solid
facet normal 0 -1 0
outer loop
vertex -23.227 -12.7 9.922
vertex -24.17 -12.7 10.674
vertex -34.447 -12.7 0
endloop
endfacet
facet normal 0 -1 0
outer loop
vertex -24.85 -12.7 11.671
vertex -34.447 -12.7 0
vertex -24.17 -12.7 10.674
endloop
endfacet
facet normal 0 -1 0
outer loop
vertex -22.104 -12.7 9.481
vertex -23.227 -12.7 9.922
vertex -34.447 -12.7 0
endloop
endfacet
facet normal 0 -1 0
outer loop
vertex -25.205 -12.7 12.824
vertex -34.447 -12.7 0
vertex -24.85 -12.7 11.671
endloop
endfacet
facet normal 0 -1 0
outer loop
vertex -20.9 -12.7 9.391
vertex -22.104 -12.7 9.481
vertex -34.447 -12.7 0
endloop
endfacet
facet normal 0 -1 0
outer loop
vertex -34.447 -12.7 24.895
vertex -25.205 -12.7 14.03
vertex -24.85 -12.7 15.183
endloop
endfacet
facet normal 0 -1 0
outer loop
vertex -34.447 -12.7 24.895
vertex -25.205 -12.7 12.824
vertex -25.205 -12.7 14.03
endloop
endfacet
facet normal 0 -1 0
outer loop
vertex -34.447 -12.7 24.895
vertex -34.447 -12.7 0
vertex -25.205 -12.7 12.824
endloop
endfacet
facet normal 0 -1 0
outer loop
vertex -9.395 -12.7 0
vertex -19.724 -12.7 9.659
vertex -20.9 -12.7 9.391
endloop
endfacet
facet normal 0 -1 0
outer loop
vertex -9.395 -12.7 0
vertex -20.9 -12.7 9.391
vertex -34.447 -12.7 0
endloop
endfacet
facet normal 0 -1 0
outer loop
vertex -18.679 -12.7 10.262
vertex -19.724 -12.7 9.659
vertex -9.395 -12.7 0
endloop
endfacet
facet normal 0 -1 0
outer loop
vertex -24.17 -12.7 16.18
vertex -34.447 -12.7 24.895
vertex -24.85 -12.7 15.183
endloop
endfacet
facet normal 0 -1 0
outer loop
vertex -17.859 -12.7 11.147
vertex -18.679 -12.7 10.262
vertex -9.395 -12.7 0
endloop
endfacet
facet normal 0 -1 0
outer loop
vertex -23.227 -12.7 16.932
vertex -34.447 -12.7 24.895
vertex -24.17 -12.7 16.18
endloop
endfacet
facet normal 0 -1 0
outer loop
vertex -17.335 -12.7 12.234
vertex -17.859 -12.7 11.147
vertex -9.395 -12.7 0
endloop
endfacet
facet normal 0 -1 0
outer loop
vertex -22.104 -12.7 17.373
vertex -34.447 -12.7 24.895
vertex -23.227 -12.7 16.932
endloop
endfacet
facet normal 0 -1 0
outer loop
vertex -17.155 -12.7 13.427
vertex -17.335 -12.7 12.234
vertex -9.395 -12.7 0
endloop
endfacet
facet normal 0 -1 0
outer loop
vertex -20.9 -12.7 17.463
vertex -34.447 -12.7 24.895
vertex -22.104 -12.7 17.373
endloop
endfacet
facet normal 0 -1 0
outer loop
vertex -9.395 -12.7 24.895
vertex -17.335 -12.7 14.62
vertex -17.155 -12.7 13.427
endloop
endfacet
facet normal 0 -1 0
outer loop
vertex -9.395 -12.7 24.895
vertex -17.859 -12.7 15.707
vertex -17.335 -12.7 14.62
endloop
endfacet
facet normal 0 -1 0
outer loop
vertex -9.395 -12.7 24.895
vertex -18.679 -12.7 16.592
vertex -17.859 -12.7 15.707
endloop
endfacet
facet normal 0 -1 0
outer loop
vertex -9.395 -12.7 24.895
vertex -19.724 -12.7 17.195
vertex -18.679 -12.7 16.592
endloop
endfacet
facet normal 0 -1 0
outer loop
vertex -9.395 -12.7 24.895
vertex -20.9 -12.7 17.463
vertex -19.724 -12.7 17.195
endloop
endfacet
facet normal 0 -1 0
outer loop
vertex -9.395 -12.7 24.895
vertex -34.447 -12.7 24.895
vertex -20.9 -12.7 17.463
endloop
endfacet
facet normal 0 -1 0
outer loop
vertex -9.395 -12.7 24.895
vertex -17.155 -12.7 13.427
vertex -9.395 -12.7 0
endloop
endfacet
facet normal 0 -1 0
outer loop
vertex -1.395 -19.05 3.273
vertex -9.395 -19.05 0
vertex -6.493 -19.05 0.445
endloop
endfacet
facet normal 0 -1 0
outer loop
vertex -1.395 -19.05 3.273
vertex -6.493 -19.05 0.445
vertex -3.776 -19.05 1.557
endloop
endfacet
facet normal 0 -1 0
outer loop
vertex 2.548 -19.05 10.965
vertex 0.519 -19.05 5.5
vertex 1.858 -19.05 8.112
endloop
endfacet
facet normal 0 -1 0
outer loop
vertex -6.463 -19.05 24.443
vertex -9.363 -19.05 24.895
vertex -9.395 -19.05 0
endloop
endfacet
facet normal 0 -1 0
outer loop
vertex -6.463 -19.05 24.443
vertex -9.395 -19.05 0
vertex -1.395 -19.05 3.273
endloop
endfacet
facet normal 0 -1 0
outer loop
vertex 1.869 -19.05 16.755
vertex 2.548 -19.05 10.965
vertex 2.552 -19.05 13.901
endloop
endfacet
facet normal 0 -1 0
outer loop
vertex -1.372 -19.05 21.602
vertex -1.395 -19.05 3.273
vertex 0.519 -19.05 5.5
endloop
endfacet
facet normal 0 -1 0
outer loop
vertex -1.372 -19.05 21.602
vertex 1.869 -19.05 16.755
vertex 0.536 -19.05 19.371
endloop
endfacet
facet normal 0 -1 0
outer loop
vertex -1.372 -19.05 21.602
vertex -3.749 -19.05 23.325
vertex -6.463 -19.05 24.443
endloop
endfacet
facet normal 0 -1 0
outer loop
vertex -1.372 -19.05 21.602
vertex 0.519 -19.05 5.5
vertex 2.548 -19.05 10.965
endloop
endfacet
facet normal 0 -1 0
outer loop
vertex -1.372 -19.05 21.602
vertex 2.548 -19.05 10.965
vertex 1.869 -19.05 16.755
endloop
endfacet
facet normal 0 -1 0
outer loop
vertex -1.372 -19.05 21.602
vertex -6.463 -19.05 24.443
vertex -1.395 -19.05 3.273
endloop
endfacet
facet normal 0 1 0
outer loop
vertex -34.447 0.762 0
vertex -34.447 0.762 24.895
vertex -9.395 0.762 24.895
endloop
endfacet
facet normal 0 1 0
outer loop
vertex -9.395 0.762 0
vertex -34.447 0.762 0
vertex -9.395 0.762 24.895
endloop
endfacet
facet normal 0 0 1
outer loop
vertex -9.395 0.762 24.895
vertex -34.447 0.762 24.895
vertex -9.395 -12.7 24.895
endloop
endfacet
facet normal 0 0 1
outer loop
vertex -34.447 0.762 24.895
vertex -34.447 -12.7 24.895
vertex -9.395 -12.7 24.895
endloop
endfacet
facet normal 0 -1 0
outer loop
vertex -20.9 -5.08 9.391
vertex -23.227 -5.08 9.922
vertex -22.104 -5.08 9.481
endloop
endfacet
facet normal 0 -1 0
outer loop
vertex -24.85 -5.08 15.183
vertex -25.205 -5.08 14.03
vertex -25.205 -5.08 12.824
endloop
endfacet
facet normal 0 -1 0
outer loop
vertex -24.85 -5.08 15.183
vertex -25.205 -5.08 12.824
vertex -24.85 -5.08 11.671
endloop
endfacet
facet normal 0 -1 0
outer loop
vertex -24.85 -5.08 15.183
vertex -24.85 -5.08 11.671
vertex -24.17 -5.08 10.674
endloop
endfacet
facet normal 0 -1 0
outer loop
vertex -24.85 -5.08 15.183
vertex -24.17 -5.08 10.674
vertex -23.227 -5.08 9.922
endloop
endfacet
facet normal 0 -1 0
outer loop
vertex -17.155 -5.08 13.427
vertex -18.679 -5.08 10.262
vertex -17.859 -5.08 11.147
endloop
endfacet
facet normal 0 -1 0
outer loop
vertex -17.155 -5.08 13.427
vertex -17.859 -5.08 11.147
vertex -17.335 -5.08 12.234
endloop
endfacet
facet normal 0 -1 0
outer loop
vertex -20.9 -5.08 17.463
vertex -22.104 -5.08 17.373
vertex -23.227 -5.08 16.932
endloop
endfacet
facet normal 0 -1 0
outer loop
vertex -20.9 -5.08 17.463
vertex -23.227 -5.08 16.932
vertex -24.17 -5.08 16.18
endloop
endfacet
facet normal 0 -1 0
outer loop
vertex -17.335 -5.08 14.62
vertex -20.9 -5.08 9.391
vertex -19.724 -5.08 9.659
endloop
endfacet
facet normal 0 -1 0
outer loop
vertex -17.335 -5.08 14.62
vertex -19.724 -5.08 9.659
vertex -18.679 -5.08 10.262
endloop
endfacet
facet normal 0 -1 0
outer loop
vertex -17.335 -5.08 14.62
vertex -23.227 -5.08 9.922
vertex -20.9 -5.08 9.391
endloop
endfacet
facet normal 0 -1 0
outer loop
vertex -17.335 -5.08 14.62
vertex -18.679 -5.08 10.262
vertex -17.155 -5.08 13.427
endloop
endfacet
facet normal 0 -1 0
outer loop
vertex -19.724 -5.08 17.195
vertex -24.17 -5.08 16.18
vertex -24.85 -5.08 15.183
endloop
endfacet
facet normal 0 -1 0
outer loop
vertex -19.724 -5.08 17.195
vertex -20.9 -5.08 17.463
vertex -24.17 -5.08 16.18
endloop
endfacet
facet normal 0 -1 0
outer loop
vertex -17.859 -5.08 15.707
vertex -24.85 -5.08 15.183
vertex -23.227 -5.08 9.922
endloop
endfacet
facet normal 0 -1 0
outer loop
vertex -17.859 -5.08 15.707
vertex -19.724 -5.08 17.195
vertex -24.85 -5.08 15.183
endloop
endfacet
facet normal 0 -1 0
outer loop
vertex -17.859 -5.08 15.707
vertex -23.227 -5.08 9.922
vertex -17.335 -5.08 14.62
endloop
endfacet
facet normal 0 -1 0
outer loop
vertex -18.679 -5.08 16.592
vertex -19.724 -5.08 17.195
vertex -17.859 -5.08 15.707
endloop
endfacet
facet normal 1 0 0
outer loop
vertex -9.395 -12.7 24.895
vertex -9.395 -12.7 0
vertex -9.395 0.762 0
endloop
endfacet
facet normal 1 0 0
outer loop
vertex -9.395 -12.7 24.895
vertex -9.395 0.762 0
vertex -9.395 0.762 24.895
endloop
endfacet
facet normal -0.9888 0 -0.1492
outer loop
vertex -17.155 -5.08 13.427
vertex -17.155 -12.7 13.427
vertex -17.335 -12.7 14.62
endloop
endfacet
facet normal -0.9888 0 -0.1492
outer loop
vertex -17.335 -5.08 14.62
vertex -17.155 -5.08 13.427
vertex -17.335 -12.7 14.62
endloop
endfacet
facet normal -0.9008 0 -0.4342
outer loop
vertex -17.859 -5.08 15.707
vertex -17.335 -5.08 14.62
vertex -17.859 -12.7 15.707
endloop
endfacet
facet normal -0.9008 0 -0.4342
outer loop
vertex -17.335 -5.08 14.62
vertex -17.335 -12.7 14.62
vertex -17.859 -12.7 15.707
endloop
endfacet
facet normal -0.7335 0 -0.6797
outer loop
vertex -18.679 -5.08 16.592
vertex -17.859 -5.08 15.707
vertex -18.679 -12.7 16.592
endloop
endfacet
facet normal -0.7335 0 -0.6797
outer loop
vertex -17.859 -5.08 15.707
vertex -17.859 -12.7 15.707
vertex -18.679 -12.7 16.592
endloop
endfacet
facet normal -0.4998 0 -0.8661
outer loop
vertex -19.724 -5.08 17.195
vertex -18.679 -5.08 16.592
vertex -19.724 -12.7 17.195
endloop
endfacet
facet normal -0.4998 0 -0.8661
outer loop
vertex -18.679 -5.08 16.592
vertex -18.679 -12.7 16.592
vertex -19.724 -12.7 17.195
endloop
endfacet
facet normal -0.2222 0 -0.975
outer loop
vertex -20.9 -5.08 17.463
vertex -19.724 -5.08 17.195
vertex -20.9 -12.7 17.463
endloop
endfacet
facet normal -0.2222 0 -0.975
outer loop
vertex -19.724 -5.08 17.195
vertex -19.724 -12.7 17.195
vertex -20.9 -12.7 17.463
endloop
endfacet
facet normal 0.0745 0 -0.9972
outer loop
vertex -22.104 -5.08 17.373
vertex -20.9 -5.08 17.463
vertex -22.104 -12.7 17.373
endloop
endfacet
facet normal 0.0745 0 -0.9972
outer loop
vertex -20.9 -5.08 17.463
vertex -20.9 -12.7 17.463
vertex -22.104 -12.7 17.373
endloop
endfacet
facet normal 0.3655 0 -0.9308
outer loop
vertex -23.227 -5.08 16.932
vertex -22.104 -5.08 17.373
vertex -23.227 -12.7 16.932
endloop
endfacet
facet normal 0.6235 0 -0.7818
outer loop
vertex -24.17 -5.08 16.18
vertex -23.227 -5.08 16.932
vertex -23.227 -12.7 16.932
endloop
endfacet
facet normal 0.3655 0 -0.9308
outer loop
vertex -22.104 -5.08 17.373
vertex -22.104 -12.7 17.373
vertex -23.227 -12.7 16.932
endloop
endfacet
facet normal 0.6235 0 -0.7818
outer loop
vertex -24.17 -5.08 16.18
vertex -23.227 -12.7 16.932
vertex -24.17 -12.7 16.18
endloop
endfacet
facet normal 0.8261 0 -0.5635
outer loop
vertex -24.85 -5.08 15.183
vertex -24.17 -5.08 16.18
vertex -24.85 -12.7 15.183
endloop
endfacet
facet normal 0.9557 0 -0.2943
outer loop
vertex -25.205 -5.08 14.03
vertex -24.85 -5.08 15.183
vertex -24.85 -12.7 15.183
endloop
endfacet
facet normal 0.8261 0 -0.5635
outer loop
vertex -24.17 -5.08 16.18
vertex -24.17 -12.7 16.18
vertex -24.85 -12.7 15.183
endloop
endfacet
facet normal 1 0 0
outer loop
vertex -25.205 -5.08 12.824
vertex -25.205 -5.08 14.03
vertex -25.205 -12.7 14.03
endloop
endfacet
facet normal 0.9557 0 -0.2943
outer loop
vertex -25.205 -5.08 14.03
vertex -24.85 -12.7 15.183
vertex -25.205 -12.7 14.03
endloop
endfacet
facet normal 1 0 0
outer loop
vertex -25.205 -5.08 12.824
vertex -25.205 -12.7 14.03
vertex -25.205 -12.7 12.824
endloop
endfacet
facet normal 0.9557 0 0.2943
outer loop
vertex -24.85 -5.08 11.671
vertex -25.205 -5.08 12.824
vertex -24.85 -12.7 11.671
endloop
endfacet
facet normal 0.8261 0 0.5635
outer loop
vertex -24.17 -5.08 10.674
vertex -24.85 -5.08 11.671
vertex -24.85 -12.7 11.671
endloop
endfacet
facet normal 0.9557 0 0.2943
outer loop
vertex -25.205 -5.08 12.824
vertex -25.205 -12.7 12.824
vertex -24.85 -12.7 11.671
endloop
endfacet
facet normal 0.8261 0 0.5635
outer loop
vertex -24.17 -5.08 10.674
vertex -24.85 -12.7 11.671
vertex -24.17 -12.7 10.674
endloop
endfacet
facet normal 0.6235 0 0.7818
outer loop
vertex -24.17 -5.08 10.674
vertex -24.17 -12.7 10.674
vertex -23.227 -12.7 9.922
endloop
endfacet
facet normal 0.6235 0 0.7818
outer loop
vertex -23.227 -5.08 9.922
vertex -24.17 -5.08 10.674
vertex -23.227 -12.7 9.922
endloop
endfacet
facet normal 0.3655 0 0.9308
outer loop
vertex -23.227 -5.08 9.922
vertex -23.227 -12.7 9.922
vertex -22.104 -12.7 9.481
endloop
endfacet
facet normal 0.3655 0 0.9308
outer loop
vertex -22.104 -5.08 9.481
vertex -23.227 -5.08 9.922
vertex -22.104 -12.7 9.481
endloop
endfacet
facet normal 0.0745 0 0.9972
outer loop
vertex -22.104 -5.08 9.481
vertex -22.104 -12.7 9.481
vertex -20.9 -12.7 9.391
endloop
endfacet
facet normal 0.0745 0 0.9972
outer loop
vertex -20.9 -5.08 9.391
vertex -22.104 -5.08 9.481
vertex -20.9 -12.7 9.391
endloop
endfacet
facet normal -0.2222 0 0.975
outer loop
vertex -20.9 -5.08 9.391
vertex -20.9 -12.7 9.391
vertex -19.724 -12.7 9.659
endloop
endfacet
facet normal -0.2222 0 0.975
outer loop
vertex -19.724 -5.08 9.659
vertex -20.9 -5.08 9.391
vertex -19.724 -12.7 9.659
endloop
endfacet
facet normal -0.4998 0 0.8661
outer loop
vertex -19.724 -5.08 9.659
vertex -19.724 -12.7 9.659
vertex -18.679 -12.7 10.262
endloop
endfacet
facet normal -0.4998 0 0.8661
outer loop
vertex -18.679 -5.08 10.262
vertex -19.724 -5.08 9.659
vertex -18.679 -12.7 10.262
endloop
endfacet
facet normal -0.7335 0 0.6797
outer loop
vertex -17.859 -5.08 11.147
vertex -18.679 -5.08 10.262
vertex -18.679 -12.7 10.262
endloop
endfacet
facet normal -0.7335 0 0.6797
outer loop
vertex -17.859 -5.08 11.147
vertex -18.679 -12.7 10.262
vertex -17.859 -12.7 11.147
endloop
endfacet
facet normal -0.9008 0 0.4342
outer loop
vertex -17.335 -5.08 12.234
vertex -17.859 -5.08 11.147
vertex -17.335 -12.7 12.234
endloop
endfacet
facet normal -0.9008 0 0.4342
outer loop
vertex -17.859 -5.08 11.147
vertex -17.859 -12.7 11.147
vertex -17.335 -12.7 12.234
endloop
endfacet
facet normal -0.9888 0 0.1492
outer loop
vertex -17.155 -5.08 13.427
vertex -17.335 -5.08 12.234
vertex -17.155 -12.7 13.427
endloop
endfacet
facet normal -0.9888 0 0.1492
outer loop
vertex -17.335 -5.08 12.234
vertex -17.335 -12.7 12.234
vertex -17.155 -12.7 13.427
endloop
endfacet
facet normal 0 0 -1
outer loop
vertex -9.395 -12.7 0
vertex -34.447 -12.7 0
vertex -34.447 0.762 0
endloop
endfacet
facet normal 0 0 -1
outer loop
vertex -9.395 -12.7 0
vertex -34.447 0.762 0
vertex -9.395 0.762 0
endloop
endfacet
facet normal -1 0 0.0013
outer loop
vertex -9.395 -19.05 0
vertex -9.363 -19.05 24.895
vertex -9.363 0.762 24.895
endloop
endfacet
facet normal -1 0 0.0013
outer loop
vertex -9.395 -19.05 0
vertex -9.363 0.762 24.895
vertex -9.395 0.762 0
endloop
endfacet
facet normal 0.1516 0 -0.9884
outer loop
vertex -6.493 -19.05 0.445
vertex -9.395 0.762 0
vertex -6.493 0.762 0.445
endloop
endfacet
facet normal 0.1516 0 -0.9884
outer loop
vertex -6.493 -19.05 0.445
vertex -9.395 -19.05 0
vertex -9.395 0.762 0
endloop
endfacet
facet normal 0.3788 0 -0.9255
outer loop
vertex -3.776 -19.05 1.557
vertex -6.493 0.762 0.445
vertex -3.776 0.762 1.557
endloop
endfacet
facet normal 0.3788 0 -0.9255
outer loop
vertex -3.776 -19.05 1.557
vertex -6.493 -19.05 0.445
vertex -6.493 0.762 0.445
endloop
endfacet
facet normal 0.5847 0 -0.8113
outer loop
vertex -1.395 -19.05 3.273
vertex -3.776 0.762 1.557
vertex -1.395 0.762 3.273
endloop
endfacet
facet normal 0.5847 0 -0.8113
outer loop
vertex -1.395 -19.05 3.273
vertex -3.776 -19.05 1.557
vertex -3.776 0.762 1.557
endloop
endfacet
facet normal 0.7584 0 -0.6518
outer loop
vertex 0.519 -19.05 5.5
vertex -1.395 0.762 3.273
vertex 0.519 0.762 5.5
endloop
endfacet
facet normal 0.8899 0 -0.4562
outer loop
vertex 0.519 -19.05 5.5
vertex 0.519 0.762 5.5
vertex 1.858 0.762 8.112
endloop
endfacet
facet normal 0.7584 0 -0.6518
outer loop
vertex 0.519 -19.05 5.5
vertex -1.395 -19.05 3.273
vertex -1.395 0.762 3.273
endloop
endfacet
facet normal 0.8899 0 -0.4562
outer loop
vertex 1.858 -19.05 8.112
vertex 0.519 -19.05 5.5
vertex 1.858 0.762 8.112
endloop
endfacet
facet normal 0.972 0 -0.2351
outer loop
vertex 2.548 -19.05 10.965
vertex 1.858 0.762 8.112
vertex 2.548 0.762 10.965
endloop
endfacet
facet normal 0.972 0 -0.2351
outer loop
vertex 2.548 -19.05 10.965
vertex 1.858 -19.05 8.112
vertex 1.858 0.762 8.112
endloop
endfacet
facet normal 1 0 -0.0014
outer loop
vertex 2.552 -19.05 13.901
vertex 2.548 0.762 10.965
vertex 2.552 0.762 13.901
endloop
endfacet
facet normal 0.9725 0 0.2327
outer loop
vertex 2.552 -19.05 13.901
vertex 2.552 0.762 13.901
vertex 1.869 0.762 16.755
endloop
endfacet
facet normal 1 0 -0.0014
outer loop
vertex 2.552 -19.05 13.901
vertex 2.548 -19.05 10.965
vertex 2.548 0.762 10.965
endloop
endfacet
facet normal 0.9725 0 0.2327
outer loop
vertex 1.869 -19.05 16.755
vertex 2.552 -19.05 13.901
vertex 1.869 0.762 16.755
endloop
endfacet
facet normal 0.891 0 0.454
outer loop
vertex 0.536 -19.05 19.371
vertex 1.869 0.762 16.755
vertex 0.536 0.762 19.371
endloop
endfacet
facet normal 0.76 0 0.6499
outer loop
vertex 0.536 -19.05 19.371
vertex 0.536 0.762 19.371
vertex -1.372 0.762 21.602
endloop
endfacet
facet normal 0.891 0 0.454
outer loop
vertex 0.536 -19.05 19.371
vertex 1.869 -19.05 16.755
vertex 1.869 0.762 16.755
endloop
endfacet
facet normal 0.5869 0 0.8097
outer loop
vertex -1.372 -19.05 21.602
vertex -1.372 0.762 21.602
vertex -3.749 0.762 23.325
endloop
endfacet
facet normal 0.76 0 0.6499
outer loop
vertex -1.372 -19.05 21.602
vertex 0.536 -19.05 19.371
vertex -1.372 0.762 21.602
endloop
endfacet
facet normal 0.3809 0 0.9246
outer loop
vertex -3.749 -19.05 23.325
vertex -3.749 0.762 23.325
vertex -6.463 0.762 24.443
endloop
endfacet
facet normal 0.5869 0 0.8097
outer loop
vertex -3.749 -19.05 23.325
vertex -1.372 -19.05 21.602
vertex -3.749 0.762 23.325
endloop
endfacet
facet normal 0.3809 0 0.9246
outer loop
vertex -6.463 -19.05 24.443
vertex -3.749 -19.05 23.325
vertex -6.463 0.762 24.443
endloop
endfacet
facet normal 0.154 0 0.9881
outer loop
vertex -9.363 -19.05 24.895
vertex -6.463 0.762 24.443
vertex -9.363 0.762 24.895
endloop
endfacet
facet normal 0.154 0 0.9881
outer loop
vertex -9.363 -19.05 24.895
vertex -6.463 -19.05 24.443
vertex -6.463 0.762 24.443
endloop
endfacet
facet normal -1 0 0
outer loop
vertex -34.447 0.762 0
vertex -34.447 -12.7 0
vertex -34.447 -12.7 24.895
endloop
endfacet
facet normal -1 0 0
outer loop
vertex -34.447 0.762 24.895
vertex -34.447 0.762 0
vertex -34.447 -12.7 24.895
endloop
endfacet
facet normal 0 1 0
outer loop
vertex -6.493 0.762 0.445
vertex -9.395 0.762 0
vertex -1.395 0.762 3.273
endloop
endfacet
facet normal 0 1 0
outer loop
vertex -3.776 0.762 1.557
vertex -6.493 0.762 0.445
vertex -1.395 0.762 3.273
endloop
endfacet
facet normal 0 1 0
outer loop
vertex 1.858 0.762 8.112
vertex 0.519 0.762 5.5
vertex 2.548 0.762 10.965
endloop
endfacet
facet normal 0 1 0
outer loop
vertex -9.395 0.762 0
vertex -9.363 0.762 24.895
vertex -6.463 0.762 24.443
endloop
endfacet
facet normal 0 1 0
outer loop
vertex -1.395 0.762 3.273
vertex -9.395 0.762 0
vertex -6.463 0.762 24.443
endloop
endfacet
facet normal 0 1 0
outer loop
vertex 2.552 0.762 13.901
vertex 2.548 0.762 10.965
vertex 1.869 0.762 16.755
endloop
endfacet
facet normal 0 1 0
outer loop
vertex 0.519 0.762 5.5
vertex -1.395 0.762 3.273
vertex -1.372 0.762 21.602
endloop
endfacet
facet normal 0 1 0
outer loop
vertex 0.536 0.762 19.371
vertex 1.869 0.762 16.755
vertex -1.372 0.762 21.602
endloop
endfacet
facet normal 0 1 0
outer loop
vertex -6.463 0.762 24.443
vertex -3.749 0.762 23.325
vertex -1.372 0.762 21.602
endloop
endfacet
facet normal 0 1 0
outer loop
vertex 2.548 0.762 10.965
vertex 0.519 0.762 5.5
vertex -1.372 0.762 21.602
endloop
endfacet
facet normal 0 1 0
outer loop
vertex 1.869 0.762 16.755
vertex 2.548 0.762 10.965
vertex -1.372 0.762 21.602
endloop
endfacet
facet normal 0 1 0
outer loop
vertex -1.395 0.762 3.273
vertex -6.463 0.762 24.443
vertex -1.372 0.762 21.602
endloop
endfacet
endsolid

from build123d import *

# Parameters (mm, degrees)
F0_W          = 25.052054
F0_H          = 24.89548
F1_DEPTH      = 12.7
F1_DEPTH_BACK = 0.762
F3_DEPTH      = 19.05
F3_DEPTH_BACK = 0.762
F4_R          = 4.047603
F5_DEPTH      = 7.62


with BuildPart() as f1:
    # F0 (on Front) → F1 (new body, two sides)
    with BuildSketch(Plane.XZ) as f1_sk:
        with Locations((-21.920548, 12.44774)):
            Rectangle(F0_W, F0_H)
    extrude(amount=F1_DEPTH)
    extrude(f1_sk.sketch, amount=-F1_DEPTH_BACK)

    # F4 (on face) → F5 (cut)
    with BuildSketch(Plane.XZ.offset(12.7)):
        with Locations((-21.202855, 13.427026)):
            Circle(F4_R)
    extrude(amount=-F5_DEPTH, mode=Mode.SUBTRACT)


with BuildPart() as f3:
    # F2 (on Front) → F3 (new body, two sides)
    with BuildSketch(Plane.XZ) as f3_sk:
        with BuildLine():
            ThreePointArc((-9.394521, 0), (2.637058, 12.43272), (-9.363402, 24.89548))
            Line((-9.363402, 24.89548), (-9.394521, 0))
        make_face()
    extrude(amount=F3_DEPTH)
    extrude(f3_sk.sketch, amount=-F3_DEPTH_BACK)


solid = Compound([f1.part, f3.part])
